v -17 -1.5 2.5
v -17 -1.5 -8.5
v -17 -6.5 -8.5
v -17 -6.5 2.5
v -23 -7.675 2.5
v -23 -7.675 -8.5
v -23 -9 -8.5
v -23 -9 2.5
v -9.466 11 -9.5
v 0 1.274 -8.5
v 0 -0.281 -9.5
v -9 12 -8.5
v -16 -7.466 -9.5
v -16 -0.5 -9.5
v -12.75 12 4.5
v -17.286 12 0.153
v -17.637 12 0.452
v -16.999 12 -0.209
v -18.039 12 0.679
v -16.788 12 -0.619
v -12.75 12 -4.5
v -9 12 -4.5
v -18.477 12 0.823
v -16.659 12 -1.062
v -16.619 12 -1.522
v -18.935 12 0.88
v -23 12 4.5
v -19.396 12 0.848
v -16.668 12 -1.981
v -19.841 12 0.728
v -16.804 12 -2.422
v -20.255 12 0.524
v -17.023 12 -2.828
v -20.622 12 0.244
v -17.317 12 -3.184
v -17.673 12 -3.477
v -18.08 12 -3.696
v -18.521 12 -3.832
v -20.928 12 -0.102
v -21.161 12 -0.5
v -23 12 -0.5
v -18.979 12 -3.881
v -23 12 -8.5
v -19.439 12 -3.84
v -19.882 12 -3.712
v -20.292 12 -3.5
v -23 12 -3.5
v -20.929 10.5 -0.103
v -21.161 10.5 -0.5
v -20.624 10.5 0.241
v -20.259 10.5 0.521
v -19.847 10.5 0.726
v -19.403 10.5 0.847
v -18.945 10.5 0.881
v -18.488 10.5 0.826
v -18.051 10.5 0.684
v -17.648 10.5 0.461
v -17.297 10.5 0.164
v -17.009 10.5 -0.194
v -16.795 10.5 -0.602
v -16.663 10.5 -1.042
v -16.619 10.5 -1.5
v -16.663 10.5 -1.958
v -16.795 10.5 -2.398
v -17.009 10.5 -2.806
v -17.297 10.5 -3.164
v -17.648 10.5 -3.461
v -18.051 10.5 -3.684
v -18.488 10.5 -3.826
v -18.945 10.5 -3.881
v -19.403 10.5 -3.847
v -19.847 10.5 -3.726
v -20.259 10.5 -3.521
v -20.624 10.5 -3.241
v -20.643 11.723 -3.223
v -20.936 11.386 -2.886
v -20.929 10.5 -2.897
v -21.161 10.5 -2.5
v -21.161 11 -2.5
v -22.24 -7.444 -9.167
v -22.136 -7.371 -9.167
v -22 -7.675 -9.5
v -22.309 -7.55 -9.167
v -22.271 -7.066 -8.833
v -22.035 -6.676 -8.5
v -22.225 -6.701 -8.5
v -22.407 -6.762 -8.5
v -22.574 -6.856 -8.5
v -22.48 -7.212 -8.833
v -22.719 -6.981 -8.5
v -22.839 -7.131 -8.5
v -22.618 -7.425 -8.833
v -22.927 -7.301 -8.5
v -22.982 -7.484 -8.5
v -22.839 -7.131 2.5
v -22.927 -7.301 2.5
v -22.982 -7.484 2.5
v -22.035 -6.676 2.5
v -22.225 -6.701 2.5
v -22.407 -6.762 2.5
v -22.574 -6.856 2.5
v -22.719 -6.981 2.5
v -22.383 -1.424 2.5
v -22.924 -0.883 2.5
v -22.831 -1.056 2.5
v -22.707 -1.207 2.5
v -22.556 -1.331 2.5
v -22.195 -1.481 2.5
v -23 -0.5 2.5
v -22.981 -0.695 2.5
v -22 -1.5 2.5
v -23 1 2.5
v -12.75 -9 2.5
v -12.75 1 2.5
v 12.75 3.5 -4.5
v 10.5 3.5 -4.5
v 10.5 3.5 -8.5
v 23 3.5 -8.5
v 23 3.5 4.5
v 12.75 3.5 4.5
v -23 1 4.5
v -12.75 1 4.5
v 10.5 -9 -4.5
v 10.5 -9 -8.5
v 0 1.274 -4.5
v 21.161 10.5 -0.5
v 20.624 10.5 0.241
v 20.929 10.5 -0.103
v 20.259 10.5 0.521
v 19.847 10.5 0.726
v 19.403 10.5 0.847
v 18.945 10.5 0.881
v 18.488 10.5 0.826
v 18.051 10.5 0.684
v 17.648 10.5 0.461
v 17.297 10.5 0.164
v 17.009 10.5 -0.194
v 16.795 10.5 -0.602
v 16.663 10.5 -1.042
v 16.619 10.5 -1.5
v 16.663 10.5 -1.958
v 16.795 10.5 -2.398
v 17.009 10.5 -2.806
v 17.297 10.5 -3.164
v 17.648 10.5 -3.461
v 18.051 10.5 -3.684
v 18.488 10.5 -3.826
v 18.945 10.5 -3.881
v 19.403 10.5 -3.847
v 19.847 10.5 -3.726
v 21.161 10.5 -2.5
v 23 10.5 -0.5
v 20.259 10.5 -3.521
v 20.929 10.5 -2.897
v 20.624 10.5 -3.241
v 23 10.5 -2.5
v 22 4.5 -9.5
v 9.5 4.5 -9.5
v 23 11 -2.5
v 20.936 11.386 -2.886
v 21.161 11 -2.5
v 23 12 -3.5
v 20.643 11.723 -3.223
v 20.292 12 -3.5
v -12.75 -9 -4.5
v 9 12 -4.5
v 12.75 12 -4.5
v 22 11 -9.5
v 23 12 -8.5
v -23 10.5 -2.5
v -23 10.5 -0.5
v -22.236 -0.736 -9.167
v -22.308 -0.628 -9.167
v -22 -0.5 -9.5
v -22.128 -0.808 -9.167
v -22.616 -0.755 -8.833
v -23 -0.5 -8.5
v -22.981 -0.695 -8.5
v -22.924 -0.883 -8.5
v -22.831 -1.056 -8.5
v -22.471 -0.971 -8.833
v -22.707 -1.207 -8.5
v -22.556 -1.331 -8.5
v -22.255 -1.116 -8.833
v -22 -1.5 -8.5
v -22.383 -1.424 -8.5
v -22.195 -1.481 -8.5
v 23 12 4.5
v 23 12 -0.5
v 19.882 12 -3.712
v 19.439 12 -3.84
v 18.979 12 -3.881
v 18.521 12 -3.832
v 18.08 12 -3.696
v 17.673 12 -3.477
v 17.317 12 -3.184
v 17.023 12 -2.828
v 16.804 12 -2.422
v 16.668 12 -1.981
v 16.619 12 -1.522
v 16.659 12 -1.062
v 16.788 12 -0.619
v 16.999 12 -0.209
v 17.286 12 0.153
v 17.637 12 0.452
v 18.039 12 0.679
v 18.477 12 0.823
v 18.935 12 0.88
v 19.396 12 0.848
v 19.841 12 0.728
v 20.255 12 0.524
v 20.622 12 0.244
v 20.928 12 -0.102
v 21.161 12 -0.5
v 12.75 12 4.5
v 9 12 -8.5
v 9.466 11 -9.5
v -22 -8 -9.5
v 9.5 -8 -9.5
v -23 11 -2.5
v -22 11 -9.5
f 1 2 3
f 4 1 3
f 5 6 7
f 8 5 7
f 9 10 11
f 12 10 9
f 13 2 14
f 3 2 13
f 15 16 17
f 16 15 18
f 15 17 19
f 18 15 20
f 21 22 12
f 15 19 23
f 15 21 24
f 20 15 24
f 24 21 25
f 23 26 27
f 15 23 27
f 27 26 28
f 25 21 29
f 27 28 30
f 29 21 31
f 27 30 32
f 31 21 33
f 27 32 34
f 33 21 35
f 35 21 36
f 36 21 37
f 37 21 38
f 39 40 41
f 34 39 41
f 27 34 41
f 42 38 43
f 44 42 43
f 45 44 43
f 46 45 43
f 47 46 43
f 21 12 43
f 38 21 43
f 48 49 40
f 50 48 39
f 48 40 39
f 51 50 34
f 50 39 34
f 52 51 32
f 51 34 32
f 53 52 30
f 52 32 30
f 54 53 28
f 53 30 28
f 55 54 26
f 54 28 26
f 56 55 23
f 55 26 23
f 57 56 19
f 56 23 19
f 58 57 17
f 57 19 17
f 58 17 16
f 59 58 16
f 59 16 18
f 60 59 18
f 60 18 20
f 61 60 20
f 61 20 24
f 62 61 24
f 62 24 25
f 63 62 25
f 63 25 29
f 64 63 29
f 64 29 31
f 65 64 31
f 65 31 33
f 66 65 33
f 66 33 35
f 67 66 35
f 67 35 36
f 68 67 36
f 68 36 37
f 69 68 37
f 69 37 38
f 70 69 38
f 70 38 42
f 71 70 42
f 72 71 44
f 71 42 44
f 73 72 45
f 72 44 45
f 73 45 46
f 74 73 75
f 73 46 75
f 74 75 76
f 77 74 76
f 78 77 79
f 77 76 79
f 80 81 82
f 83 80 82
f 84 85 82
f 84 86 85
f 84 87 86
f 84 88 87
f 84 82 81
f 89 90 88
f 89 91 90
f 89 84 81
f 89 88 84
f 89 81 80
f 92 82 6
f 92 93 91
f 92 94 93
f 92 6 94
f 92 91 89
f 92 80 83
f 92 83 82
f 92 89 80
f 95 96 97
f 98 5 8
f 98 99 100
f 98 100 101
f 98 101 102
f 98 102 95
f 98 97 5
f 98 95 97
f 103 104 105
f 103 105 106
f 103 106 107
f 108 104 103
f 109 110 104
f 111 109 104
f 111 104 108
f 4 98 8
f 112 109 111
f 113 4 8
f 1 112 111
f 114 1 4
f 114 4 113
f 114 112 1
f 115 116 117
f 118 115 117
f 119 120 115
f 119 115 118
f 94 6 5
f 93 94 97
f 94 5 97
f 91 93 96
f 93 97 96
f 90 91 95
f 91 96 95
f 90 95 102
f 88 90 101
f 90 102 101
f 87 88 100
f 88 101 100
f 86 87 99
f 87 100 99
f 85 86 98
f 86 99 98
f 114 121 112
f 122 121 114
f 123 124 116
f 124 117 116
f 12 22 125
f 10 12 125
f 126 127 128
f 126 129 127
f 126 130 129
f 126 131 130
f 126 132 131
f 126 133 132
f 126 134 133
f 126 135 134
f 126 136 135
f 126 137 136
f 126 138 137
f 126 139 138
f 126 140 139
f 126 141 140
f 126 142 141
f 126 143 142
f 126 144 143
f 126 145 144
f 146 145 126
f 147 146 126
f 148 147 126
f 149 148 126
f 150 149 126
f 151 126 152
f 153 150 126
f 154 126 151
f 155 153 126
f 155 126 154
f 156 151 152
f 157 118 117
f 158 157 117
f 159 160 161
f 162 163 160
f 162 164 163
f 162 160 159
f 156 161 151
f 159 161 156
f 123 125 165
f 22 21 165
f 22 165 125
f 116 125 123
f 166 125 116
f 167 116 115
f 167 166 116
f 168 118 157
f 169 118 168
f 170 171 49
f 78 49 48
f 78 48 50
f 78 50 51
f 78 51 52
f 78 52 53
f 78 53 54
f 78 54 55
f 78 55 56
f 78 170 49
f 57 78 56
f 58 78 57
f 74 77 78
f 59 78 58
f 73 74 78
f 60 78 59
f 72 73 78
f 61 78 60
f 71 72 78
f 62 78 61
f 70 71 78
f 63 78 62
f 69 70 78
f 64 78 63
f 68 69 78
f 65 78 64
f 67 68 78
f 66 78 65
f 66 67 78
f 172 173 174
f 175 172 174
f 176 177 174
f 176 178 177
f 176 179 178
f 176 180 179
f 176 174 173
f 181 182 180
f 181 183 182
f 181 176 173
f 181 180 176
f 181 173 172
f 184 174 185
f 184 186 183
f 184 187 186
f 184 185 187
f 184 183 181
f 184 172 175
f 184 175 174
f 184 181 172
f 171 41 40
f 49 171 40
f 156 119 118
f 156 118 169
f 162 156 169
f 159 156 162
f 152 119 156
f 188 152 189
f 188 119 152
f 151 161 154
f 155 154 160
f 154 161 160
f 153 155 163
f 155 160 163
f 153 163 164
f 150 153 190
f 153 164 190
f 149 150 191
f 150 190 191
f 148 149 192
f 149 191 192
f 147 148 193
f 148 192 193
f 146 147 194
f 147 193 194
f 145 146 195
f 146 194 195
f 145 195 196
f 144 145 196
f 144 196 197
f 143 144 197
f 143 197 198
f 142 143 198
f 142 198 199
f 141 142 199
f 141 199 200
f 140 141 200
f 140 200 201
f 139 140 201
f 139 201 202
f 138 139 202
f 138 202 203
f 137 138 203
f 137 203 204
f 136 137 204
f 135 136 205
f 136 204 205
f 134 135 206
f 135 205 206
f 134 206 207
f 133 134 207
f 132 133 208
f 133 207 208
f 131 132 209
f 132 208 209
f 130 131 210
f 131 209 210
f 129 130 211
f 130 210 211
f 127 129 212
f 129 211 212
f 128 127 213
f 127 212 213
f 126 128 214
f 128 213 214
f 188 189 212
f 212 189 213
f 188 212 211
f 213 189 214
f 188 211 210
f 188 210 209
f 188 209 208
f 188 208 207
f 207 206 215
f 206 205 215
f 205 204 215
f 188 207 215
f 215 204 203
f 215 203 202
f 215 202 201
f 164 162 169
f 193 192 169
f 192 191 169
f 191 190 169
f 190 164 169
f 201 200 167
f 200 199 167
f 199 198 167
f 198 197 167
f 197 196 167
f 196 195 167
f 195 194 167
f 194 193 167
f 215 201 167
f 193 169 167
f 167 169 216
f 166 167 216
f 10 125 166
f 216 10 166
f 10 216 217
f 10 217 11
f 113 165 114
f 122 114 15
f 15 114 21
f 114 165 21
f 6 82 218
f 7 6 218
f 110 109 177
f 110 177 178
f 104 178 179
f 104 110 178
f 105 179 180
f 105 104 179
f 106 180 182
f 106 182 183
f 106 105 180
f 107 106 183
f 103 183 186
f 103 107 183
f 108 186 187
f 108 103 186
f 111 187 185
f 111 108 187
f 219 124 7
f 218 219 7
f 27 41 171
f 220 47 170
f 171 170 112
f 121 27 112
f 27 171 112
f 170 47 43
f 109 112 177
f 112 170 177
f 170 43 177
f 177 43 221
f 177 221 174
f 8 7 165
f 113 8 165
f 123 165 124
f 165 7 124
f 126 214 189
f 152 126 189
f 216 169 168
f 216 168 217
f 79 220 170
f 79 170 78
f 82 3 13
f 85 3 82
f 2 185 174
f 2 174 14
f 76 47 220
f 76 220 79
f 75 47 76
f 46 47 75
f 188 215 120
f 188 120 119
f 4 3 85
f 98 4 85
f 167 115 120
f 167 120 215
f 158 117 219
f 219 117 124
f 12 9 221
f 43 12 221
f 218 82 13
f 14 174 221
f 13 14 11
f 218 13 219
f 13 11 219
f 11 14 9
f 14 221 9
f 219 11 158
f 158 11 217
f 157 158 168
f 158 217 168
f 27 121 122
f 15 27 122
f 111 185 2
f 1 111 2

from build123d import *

# Parameters (mm, degrees)
BOSS_EXTRUDE1_DEPTH = 9.5
SKETCH5_R           = 2.38125
CUT_EXTRUDE1_DEPTH  = 1.5
SKETCH9_W           = 21
SKETCH9_H           = 5
BOSS_EXTRUDE6_DEPTH = 9
SKETCH10_W          = 21
SKETCH10_H          = 14
CUT_EXTRUDE4_DEPTH  = 28.626979567
CUT_EXTRUDE5_DEPTH  = 5
SKETCH12_W          = 24
SKETCH12_H          = 9
BOSS_EXTRUDE7_DEPTH = 5
CUT_EXTRUDE6_DEPTH  = 6
SKETCH15_W          = 46
SKETCH15_H          = 3.5
CUT_EXTRUDE7_DEPTH  = 16.5
SKETCH16_W          = 12.5
SKETCH16_H          = 3.5
CUT_EXTRUDE8_DEPTH  = 16.5
BOSS_EXTRUDE8_DEPTH = 5
SKETCH18_W          = 25.5
SKETCH18_H          = 8.5
CUT_EXTRUDE9_DEPTH  = 9
BOSS_EXTRUDE9_DEPTH = 9
FILLET1_R           = 1
SKETCH20_W          = 10.25
SKETCH20_H          = 10
CUT_EXTRUDE10_DEPTH = 2
SKETCH23_W          = 1.838900381
SKETCH23_H          = 2
CUT_EXTRUDE11_DEPTH = 1.5
CHAMFER1_SIZE       = 1
CHAMFER2_SIZE       = 1


with BuildPart() as part:
    # Sketch2 → Boss-Extrude1 (new, symmetric)
    with BuildSketch(Plane.XY):
        Polygon((-12, 3), (-12, 12), (-23, 12), (-23, 0), (23, 0), (23, 12), (12, 12), (12, 3), align=None)
    extrude(amount=BOSS_EXTRUDE1_DEPTH, both=True)

    # Sketch5 → Cut-Extrude1 (cut)
    with BuildSketch(Plane(origin=(0, 12, 0), x_dir=(1, 0, 0), z_dir=(0, 1, 0))):
        with Locations(Location((-19, 1.5, 0), (0, 0, 180))):
            Circle(SKETCH5_R)
        with Locations(Location((19, 1.5, 0), (0, 0, 180))):
            Circle(SKETCH5_R)
    extrude(amount=-CUT_EXTRUDE1_DEPTH, mode=Mode.SUBTRACT)

    # Sketch9 → Boss-Extrude6 (add)
    with BuildSketch(Plane.XZ):
        with Locations((0, -7)):
            Rectangle(SKETCH9_W, SKETCH9_H)
    extrude(amount=BOSS_EXTRUDE6_DEPTH)

    # Sketch10 → Cut-Extrude4 (cut, through all)
    with BuildSketch(Plane.XZ):
        with Locations((0, 2.5)):
            Rectangle(SKETCH10_W, SKETCH10_H)
    extrude(amount=-CUT_EXTRUDE4_DEPTH, mode=Mode.SUBTRACT)

    # Sketch11 → Cut-Extrude5 (cut)
    with BuildSketch(Plane.XY.offset(9.5)):
        Polygon((10.5, 3), (10.5, 0), (23, 0), (23, 12), (12, 12), (12, 3), align=None)
        Polygon((-10.5, 0), (-10.5, 3), (-12, 3), (-12, 12), (-23, 12), (-23, 0), align=None)
    extrude(amount=-CUT_EXTRUDE5_DEPTH, mode=Mode.SUBTRACT)

    # Sketch12 → Boss-Extrude7 (add)
    with BuildSketch(Plane(origin=(0, 0, -9.5), x_dir=(-1, 0, 0), z_dir=(0, 0, -1))):
        with Locations((0, 7.5)):
            Rectangle(SKETCH12_W, SKETCH12_H)
    extrude(amount=-BOSS_EXTRUDE7_DEPTH)

    # Sketch13 → Cut-Extrude6 (cut)
    with BuildSketch(Plane.XY.offset(-4.5)):
        Polygon((-9, 12), (0, 1.274217667), (9, 12), align=None)
    extrude(amount=-CUT_EXTRUDE6_DEPTH, mode=Mode.SUBTRACT)

    # Sketch15 → Cut-Extrude7 (cut)
    with BuildSketch(Plane.XY.offset(-4.5)):
        with Locations((0, 1.75)):
            Rectangle(SKETCH15_W, SKETCH15_H)
    extrude(amount=CUT_EXTRUDE7_DEPTH, mode=Mode.SUBTRACT)

    # Sketch16 → Cut-Extrude8 (cut)
    with BuildSketch(Plane.XY.offset(-4.5)):
        with Locations((-16.75, 1.75)):
            Rectangle(SKETCH16_W, SKETCH16_H)
        with Locations((16.75, 1.75)):
            Rectangle(SKETCH16_W, SKETCH16_H)
    extrude(amount=-CUT_EXTRUDE8_DEPTH, mode=Mode.SUBTRACT)

    # Sketch17 → Boss-Extrude8 (add)
    with BuildSketch(Plane(origin=(0, 0, -9.5), x_dir=(-1, 0, 0), z_dir=(0, 0, -1))):
        Polygon((10.5, 3.5), (23, 3.5), (23, -1.5), (17, -1.5), (17, -6.5), (23, -6.709524617), (23, -9), (10.5, -9), align=None)
    extrude(amount=-BOSS_EXTRUDE8_DEPTH)

    # Sketch18 → Cut-Extrude9 (cut)
    with BuildSketch(Plane.XY.offset(-4.5)):
        with Locations((0, 7.75)):
            Rectangle(SKETCH18_W, SKETCH18_H)
    extrude(amount=CUT_EXTRUDE9_DEPTH, mode=Mode.SUBTRACT)

    # Sketch19 → Boss-Extrude9 (add)
    with BuildSketch(Plane.XY.offset(-4.5)):
        Polygon((-12.75, 3.5), (-23, 3.5), (-23, -1.5), (-17, -1.5), (-17, -6.5), (-23, -6.709524617), (-23, -9), (-12.75, -9), align=None)
    extrude(amount=BOSS_EXTRUDE9_DEPTH)

    # Fillet1
    fillet1_edges = [part.edges().sort_by_distance(p)[0] for p in [
        (-23, -1.5, -2.5),
        (-23, -6.709524617, -2.5),
    ]]
    fillet(fillet1_edges, radius=FILLET1_R)

    # Sketch20 → Cut-Extrude10 (cut)
    with BuildSketch(Plane.XY.offset(4.5)):
        with Locations((-17.875, -4)):
            Rectangle(SKETCH20_W, SKETCH20_H)
    extrude(amount=-CUT_EXTRUDE10_DEPTH, mode=Mode.SUBTRACT)

    # Sketch23 → Cut-Extrude11 (cut)
    with BuildSketch(Plane(origin=(0, 12, 0), x_dir=(1, 0, 0), z_dir=(0, 1, 0))):
        with Locations((-22.080549809, 1.5)):
            Rectangle(SKETCH23_W, SKETCH23_H)
        with Locations((22.080549809, 1.5)):
            Rectangle(SKETCH23_W, SKETCH23_H)
    extrude(amount=-CUT_EXTRUDE11_DEPTH, mode=Mode.SUBTRACT)

    # Chamfer1
    chamfer1_edges = [part.edges().sort_by_distance(p)[0] for p in [
        (-22.080549809, 12, -2.5),
        (22.080549809, 12, -2.5),
    ]]
    chamfer(chamfer1_edges, length=CHAMFER1_SIZE)

    # Chamfer2
    chamfer2_edges = [part.edges().sort_by_distance(p)[0] for p in [
        (16, 12, -9.5),
        (-16, 12, -9.5),
        (4.5, 6.637108833, -9.5),
        (-4.5, 6.637108833, -9.5),
        (23, 7.75, -9.5),
        (16.75, 3.5, -9.5),
        (-23, -8.337606696, -9.5),
        (-17, -4, -9.5),
        (-19.5, -1.5, -9.5),
        (-19.517449748, -6.587911282, -9.5),
        (-22.7193398, -6.980555021, -9.5),
        (-22.707106781, -1.207106781, -9.5),
        (10.5, -2.75, -9.5),
        (-6.25, -9, -9.5),
        (-23, 5.75, -9.5),
    ]]
    chamfer(chamfer2_edges, length=CHAMFER2_SIZE - 0.0001)  # a hair under: the kernel refuses the full size


solid = part.part
